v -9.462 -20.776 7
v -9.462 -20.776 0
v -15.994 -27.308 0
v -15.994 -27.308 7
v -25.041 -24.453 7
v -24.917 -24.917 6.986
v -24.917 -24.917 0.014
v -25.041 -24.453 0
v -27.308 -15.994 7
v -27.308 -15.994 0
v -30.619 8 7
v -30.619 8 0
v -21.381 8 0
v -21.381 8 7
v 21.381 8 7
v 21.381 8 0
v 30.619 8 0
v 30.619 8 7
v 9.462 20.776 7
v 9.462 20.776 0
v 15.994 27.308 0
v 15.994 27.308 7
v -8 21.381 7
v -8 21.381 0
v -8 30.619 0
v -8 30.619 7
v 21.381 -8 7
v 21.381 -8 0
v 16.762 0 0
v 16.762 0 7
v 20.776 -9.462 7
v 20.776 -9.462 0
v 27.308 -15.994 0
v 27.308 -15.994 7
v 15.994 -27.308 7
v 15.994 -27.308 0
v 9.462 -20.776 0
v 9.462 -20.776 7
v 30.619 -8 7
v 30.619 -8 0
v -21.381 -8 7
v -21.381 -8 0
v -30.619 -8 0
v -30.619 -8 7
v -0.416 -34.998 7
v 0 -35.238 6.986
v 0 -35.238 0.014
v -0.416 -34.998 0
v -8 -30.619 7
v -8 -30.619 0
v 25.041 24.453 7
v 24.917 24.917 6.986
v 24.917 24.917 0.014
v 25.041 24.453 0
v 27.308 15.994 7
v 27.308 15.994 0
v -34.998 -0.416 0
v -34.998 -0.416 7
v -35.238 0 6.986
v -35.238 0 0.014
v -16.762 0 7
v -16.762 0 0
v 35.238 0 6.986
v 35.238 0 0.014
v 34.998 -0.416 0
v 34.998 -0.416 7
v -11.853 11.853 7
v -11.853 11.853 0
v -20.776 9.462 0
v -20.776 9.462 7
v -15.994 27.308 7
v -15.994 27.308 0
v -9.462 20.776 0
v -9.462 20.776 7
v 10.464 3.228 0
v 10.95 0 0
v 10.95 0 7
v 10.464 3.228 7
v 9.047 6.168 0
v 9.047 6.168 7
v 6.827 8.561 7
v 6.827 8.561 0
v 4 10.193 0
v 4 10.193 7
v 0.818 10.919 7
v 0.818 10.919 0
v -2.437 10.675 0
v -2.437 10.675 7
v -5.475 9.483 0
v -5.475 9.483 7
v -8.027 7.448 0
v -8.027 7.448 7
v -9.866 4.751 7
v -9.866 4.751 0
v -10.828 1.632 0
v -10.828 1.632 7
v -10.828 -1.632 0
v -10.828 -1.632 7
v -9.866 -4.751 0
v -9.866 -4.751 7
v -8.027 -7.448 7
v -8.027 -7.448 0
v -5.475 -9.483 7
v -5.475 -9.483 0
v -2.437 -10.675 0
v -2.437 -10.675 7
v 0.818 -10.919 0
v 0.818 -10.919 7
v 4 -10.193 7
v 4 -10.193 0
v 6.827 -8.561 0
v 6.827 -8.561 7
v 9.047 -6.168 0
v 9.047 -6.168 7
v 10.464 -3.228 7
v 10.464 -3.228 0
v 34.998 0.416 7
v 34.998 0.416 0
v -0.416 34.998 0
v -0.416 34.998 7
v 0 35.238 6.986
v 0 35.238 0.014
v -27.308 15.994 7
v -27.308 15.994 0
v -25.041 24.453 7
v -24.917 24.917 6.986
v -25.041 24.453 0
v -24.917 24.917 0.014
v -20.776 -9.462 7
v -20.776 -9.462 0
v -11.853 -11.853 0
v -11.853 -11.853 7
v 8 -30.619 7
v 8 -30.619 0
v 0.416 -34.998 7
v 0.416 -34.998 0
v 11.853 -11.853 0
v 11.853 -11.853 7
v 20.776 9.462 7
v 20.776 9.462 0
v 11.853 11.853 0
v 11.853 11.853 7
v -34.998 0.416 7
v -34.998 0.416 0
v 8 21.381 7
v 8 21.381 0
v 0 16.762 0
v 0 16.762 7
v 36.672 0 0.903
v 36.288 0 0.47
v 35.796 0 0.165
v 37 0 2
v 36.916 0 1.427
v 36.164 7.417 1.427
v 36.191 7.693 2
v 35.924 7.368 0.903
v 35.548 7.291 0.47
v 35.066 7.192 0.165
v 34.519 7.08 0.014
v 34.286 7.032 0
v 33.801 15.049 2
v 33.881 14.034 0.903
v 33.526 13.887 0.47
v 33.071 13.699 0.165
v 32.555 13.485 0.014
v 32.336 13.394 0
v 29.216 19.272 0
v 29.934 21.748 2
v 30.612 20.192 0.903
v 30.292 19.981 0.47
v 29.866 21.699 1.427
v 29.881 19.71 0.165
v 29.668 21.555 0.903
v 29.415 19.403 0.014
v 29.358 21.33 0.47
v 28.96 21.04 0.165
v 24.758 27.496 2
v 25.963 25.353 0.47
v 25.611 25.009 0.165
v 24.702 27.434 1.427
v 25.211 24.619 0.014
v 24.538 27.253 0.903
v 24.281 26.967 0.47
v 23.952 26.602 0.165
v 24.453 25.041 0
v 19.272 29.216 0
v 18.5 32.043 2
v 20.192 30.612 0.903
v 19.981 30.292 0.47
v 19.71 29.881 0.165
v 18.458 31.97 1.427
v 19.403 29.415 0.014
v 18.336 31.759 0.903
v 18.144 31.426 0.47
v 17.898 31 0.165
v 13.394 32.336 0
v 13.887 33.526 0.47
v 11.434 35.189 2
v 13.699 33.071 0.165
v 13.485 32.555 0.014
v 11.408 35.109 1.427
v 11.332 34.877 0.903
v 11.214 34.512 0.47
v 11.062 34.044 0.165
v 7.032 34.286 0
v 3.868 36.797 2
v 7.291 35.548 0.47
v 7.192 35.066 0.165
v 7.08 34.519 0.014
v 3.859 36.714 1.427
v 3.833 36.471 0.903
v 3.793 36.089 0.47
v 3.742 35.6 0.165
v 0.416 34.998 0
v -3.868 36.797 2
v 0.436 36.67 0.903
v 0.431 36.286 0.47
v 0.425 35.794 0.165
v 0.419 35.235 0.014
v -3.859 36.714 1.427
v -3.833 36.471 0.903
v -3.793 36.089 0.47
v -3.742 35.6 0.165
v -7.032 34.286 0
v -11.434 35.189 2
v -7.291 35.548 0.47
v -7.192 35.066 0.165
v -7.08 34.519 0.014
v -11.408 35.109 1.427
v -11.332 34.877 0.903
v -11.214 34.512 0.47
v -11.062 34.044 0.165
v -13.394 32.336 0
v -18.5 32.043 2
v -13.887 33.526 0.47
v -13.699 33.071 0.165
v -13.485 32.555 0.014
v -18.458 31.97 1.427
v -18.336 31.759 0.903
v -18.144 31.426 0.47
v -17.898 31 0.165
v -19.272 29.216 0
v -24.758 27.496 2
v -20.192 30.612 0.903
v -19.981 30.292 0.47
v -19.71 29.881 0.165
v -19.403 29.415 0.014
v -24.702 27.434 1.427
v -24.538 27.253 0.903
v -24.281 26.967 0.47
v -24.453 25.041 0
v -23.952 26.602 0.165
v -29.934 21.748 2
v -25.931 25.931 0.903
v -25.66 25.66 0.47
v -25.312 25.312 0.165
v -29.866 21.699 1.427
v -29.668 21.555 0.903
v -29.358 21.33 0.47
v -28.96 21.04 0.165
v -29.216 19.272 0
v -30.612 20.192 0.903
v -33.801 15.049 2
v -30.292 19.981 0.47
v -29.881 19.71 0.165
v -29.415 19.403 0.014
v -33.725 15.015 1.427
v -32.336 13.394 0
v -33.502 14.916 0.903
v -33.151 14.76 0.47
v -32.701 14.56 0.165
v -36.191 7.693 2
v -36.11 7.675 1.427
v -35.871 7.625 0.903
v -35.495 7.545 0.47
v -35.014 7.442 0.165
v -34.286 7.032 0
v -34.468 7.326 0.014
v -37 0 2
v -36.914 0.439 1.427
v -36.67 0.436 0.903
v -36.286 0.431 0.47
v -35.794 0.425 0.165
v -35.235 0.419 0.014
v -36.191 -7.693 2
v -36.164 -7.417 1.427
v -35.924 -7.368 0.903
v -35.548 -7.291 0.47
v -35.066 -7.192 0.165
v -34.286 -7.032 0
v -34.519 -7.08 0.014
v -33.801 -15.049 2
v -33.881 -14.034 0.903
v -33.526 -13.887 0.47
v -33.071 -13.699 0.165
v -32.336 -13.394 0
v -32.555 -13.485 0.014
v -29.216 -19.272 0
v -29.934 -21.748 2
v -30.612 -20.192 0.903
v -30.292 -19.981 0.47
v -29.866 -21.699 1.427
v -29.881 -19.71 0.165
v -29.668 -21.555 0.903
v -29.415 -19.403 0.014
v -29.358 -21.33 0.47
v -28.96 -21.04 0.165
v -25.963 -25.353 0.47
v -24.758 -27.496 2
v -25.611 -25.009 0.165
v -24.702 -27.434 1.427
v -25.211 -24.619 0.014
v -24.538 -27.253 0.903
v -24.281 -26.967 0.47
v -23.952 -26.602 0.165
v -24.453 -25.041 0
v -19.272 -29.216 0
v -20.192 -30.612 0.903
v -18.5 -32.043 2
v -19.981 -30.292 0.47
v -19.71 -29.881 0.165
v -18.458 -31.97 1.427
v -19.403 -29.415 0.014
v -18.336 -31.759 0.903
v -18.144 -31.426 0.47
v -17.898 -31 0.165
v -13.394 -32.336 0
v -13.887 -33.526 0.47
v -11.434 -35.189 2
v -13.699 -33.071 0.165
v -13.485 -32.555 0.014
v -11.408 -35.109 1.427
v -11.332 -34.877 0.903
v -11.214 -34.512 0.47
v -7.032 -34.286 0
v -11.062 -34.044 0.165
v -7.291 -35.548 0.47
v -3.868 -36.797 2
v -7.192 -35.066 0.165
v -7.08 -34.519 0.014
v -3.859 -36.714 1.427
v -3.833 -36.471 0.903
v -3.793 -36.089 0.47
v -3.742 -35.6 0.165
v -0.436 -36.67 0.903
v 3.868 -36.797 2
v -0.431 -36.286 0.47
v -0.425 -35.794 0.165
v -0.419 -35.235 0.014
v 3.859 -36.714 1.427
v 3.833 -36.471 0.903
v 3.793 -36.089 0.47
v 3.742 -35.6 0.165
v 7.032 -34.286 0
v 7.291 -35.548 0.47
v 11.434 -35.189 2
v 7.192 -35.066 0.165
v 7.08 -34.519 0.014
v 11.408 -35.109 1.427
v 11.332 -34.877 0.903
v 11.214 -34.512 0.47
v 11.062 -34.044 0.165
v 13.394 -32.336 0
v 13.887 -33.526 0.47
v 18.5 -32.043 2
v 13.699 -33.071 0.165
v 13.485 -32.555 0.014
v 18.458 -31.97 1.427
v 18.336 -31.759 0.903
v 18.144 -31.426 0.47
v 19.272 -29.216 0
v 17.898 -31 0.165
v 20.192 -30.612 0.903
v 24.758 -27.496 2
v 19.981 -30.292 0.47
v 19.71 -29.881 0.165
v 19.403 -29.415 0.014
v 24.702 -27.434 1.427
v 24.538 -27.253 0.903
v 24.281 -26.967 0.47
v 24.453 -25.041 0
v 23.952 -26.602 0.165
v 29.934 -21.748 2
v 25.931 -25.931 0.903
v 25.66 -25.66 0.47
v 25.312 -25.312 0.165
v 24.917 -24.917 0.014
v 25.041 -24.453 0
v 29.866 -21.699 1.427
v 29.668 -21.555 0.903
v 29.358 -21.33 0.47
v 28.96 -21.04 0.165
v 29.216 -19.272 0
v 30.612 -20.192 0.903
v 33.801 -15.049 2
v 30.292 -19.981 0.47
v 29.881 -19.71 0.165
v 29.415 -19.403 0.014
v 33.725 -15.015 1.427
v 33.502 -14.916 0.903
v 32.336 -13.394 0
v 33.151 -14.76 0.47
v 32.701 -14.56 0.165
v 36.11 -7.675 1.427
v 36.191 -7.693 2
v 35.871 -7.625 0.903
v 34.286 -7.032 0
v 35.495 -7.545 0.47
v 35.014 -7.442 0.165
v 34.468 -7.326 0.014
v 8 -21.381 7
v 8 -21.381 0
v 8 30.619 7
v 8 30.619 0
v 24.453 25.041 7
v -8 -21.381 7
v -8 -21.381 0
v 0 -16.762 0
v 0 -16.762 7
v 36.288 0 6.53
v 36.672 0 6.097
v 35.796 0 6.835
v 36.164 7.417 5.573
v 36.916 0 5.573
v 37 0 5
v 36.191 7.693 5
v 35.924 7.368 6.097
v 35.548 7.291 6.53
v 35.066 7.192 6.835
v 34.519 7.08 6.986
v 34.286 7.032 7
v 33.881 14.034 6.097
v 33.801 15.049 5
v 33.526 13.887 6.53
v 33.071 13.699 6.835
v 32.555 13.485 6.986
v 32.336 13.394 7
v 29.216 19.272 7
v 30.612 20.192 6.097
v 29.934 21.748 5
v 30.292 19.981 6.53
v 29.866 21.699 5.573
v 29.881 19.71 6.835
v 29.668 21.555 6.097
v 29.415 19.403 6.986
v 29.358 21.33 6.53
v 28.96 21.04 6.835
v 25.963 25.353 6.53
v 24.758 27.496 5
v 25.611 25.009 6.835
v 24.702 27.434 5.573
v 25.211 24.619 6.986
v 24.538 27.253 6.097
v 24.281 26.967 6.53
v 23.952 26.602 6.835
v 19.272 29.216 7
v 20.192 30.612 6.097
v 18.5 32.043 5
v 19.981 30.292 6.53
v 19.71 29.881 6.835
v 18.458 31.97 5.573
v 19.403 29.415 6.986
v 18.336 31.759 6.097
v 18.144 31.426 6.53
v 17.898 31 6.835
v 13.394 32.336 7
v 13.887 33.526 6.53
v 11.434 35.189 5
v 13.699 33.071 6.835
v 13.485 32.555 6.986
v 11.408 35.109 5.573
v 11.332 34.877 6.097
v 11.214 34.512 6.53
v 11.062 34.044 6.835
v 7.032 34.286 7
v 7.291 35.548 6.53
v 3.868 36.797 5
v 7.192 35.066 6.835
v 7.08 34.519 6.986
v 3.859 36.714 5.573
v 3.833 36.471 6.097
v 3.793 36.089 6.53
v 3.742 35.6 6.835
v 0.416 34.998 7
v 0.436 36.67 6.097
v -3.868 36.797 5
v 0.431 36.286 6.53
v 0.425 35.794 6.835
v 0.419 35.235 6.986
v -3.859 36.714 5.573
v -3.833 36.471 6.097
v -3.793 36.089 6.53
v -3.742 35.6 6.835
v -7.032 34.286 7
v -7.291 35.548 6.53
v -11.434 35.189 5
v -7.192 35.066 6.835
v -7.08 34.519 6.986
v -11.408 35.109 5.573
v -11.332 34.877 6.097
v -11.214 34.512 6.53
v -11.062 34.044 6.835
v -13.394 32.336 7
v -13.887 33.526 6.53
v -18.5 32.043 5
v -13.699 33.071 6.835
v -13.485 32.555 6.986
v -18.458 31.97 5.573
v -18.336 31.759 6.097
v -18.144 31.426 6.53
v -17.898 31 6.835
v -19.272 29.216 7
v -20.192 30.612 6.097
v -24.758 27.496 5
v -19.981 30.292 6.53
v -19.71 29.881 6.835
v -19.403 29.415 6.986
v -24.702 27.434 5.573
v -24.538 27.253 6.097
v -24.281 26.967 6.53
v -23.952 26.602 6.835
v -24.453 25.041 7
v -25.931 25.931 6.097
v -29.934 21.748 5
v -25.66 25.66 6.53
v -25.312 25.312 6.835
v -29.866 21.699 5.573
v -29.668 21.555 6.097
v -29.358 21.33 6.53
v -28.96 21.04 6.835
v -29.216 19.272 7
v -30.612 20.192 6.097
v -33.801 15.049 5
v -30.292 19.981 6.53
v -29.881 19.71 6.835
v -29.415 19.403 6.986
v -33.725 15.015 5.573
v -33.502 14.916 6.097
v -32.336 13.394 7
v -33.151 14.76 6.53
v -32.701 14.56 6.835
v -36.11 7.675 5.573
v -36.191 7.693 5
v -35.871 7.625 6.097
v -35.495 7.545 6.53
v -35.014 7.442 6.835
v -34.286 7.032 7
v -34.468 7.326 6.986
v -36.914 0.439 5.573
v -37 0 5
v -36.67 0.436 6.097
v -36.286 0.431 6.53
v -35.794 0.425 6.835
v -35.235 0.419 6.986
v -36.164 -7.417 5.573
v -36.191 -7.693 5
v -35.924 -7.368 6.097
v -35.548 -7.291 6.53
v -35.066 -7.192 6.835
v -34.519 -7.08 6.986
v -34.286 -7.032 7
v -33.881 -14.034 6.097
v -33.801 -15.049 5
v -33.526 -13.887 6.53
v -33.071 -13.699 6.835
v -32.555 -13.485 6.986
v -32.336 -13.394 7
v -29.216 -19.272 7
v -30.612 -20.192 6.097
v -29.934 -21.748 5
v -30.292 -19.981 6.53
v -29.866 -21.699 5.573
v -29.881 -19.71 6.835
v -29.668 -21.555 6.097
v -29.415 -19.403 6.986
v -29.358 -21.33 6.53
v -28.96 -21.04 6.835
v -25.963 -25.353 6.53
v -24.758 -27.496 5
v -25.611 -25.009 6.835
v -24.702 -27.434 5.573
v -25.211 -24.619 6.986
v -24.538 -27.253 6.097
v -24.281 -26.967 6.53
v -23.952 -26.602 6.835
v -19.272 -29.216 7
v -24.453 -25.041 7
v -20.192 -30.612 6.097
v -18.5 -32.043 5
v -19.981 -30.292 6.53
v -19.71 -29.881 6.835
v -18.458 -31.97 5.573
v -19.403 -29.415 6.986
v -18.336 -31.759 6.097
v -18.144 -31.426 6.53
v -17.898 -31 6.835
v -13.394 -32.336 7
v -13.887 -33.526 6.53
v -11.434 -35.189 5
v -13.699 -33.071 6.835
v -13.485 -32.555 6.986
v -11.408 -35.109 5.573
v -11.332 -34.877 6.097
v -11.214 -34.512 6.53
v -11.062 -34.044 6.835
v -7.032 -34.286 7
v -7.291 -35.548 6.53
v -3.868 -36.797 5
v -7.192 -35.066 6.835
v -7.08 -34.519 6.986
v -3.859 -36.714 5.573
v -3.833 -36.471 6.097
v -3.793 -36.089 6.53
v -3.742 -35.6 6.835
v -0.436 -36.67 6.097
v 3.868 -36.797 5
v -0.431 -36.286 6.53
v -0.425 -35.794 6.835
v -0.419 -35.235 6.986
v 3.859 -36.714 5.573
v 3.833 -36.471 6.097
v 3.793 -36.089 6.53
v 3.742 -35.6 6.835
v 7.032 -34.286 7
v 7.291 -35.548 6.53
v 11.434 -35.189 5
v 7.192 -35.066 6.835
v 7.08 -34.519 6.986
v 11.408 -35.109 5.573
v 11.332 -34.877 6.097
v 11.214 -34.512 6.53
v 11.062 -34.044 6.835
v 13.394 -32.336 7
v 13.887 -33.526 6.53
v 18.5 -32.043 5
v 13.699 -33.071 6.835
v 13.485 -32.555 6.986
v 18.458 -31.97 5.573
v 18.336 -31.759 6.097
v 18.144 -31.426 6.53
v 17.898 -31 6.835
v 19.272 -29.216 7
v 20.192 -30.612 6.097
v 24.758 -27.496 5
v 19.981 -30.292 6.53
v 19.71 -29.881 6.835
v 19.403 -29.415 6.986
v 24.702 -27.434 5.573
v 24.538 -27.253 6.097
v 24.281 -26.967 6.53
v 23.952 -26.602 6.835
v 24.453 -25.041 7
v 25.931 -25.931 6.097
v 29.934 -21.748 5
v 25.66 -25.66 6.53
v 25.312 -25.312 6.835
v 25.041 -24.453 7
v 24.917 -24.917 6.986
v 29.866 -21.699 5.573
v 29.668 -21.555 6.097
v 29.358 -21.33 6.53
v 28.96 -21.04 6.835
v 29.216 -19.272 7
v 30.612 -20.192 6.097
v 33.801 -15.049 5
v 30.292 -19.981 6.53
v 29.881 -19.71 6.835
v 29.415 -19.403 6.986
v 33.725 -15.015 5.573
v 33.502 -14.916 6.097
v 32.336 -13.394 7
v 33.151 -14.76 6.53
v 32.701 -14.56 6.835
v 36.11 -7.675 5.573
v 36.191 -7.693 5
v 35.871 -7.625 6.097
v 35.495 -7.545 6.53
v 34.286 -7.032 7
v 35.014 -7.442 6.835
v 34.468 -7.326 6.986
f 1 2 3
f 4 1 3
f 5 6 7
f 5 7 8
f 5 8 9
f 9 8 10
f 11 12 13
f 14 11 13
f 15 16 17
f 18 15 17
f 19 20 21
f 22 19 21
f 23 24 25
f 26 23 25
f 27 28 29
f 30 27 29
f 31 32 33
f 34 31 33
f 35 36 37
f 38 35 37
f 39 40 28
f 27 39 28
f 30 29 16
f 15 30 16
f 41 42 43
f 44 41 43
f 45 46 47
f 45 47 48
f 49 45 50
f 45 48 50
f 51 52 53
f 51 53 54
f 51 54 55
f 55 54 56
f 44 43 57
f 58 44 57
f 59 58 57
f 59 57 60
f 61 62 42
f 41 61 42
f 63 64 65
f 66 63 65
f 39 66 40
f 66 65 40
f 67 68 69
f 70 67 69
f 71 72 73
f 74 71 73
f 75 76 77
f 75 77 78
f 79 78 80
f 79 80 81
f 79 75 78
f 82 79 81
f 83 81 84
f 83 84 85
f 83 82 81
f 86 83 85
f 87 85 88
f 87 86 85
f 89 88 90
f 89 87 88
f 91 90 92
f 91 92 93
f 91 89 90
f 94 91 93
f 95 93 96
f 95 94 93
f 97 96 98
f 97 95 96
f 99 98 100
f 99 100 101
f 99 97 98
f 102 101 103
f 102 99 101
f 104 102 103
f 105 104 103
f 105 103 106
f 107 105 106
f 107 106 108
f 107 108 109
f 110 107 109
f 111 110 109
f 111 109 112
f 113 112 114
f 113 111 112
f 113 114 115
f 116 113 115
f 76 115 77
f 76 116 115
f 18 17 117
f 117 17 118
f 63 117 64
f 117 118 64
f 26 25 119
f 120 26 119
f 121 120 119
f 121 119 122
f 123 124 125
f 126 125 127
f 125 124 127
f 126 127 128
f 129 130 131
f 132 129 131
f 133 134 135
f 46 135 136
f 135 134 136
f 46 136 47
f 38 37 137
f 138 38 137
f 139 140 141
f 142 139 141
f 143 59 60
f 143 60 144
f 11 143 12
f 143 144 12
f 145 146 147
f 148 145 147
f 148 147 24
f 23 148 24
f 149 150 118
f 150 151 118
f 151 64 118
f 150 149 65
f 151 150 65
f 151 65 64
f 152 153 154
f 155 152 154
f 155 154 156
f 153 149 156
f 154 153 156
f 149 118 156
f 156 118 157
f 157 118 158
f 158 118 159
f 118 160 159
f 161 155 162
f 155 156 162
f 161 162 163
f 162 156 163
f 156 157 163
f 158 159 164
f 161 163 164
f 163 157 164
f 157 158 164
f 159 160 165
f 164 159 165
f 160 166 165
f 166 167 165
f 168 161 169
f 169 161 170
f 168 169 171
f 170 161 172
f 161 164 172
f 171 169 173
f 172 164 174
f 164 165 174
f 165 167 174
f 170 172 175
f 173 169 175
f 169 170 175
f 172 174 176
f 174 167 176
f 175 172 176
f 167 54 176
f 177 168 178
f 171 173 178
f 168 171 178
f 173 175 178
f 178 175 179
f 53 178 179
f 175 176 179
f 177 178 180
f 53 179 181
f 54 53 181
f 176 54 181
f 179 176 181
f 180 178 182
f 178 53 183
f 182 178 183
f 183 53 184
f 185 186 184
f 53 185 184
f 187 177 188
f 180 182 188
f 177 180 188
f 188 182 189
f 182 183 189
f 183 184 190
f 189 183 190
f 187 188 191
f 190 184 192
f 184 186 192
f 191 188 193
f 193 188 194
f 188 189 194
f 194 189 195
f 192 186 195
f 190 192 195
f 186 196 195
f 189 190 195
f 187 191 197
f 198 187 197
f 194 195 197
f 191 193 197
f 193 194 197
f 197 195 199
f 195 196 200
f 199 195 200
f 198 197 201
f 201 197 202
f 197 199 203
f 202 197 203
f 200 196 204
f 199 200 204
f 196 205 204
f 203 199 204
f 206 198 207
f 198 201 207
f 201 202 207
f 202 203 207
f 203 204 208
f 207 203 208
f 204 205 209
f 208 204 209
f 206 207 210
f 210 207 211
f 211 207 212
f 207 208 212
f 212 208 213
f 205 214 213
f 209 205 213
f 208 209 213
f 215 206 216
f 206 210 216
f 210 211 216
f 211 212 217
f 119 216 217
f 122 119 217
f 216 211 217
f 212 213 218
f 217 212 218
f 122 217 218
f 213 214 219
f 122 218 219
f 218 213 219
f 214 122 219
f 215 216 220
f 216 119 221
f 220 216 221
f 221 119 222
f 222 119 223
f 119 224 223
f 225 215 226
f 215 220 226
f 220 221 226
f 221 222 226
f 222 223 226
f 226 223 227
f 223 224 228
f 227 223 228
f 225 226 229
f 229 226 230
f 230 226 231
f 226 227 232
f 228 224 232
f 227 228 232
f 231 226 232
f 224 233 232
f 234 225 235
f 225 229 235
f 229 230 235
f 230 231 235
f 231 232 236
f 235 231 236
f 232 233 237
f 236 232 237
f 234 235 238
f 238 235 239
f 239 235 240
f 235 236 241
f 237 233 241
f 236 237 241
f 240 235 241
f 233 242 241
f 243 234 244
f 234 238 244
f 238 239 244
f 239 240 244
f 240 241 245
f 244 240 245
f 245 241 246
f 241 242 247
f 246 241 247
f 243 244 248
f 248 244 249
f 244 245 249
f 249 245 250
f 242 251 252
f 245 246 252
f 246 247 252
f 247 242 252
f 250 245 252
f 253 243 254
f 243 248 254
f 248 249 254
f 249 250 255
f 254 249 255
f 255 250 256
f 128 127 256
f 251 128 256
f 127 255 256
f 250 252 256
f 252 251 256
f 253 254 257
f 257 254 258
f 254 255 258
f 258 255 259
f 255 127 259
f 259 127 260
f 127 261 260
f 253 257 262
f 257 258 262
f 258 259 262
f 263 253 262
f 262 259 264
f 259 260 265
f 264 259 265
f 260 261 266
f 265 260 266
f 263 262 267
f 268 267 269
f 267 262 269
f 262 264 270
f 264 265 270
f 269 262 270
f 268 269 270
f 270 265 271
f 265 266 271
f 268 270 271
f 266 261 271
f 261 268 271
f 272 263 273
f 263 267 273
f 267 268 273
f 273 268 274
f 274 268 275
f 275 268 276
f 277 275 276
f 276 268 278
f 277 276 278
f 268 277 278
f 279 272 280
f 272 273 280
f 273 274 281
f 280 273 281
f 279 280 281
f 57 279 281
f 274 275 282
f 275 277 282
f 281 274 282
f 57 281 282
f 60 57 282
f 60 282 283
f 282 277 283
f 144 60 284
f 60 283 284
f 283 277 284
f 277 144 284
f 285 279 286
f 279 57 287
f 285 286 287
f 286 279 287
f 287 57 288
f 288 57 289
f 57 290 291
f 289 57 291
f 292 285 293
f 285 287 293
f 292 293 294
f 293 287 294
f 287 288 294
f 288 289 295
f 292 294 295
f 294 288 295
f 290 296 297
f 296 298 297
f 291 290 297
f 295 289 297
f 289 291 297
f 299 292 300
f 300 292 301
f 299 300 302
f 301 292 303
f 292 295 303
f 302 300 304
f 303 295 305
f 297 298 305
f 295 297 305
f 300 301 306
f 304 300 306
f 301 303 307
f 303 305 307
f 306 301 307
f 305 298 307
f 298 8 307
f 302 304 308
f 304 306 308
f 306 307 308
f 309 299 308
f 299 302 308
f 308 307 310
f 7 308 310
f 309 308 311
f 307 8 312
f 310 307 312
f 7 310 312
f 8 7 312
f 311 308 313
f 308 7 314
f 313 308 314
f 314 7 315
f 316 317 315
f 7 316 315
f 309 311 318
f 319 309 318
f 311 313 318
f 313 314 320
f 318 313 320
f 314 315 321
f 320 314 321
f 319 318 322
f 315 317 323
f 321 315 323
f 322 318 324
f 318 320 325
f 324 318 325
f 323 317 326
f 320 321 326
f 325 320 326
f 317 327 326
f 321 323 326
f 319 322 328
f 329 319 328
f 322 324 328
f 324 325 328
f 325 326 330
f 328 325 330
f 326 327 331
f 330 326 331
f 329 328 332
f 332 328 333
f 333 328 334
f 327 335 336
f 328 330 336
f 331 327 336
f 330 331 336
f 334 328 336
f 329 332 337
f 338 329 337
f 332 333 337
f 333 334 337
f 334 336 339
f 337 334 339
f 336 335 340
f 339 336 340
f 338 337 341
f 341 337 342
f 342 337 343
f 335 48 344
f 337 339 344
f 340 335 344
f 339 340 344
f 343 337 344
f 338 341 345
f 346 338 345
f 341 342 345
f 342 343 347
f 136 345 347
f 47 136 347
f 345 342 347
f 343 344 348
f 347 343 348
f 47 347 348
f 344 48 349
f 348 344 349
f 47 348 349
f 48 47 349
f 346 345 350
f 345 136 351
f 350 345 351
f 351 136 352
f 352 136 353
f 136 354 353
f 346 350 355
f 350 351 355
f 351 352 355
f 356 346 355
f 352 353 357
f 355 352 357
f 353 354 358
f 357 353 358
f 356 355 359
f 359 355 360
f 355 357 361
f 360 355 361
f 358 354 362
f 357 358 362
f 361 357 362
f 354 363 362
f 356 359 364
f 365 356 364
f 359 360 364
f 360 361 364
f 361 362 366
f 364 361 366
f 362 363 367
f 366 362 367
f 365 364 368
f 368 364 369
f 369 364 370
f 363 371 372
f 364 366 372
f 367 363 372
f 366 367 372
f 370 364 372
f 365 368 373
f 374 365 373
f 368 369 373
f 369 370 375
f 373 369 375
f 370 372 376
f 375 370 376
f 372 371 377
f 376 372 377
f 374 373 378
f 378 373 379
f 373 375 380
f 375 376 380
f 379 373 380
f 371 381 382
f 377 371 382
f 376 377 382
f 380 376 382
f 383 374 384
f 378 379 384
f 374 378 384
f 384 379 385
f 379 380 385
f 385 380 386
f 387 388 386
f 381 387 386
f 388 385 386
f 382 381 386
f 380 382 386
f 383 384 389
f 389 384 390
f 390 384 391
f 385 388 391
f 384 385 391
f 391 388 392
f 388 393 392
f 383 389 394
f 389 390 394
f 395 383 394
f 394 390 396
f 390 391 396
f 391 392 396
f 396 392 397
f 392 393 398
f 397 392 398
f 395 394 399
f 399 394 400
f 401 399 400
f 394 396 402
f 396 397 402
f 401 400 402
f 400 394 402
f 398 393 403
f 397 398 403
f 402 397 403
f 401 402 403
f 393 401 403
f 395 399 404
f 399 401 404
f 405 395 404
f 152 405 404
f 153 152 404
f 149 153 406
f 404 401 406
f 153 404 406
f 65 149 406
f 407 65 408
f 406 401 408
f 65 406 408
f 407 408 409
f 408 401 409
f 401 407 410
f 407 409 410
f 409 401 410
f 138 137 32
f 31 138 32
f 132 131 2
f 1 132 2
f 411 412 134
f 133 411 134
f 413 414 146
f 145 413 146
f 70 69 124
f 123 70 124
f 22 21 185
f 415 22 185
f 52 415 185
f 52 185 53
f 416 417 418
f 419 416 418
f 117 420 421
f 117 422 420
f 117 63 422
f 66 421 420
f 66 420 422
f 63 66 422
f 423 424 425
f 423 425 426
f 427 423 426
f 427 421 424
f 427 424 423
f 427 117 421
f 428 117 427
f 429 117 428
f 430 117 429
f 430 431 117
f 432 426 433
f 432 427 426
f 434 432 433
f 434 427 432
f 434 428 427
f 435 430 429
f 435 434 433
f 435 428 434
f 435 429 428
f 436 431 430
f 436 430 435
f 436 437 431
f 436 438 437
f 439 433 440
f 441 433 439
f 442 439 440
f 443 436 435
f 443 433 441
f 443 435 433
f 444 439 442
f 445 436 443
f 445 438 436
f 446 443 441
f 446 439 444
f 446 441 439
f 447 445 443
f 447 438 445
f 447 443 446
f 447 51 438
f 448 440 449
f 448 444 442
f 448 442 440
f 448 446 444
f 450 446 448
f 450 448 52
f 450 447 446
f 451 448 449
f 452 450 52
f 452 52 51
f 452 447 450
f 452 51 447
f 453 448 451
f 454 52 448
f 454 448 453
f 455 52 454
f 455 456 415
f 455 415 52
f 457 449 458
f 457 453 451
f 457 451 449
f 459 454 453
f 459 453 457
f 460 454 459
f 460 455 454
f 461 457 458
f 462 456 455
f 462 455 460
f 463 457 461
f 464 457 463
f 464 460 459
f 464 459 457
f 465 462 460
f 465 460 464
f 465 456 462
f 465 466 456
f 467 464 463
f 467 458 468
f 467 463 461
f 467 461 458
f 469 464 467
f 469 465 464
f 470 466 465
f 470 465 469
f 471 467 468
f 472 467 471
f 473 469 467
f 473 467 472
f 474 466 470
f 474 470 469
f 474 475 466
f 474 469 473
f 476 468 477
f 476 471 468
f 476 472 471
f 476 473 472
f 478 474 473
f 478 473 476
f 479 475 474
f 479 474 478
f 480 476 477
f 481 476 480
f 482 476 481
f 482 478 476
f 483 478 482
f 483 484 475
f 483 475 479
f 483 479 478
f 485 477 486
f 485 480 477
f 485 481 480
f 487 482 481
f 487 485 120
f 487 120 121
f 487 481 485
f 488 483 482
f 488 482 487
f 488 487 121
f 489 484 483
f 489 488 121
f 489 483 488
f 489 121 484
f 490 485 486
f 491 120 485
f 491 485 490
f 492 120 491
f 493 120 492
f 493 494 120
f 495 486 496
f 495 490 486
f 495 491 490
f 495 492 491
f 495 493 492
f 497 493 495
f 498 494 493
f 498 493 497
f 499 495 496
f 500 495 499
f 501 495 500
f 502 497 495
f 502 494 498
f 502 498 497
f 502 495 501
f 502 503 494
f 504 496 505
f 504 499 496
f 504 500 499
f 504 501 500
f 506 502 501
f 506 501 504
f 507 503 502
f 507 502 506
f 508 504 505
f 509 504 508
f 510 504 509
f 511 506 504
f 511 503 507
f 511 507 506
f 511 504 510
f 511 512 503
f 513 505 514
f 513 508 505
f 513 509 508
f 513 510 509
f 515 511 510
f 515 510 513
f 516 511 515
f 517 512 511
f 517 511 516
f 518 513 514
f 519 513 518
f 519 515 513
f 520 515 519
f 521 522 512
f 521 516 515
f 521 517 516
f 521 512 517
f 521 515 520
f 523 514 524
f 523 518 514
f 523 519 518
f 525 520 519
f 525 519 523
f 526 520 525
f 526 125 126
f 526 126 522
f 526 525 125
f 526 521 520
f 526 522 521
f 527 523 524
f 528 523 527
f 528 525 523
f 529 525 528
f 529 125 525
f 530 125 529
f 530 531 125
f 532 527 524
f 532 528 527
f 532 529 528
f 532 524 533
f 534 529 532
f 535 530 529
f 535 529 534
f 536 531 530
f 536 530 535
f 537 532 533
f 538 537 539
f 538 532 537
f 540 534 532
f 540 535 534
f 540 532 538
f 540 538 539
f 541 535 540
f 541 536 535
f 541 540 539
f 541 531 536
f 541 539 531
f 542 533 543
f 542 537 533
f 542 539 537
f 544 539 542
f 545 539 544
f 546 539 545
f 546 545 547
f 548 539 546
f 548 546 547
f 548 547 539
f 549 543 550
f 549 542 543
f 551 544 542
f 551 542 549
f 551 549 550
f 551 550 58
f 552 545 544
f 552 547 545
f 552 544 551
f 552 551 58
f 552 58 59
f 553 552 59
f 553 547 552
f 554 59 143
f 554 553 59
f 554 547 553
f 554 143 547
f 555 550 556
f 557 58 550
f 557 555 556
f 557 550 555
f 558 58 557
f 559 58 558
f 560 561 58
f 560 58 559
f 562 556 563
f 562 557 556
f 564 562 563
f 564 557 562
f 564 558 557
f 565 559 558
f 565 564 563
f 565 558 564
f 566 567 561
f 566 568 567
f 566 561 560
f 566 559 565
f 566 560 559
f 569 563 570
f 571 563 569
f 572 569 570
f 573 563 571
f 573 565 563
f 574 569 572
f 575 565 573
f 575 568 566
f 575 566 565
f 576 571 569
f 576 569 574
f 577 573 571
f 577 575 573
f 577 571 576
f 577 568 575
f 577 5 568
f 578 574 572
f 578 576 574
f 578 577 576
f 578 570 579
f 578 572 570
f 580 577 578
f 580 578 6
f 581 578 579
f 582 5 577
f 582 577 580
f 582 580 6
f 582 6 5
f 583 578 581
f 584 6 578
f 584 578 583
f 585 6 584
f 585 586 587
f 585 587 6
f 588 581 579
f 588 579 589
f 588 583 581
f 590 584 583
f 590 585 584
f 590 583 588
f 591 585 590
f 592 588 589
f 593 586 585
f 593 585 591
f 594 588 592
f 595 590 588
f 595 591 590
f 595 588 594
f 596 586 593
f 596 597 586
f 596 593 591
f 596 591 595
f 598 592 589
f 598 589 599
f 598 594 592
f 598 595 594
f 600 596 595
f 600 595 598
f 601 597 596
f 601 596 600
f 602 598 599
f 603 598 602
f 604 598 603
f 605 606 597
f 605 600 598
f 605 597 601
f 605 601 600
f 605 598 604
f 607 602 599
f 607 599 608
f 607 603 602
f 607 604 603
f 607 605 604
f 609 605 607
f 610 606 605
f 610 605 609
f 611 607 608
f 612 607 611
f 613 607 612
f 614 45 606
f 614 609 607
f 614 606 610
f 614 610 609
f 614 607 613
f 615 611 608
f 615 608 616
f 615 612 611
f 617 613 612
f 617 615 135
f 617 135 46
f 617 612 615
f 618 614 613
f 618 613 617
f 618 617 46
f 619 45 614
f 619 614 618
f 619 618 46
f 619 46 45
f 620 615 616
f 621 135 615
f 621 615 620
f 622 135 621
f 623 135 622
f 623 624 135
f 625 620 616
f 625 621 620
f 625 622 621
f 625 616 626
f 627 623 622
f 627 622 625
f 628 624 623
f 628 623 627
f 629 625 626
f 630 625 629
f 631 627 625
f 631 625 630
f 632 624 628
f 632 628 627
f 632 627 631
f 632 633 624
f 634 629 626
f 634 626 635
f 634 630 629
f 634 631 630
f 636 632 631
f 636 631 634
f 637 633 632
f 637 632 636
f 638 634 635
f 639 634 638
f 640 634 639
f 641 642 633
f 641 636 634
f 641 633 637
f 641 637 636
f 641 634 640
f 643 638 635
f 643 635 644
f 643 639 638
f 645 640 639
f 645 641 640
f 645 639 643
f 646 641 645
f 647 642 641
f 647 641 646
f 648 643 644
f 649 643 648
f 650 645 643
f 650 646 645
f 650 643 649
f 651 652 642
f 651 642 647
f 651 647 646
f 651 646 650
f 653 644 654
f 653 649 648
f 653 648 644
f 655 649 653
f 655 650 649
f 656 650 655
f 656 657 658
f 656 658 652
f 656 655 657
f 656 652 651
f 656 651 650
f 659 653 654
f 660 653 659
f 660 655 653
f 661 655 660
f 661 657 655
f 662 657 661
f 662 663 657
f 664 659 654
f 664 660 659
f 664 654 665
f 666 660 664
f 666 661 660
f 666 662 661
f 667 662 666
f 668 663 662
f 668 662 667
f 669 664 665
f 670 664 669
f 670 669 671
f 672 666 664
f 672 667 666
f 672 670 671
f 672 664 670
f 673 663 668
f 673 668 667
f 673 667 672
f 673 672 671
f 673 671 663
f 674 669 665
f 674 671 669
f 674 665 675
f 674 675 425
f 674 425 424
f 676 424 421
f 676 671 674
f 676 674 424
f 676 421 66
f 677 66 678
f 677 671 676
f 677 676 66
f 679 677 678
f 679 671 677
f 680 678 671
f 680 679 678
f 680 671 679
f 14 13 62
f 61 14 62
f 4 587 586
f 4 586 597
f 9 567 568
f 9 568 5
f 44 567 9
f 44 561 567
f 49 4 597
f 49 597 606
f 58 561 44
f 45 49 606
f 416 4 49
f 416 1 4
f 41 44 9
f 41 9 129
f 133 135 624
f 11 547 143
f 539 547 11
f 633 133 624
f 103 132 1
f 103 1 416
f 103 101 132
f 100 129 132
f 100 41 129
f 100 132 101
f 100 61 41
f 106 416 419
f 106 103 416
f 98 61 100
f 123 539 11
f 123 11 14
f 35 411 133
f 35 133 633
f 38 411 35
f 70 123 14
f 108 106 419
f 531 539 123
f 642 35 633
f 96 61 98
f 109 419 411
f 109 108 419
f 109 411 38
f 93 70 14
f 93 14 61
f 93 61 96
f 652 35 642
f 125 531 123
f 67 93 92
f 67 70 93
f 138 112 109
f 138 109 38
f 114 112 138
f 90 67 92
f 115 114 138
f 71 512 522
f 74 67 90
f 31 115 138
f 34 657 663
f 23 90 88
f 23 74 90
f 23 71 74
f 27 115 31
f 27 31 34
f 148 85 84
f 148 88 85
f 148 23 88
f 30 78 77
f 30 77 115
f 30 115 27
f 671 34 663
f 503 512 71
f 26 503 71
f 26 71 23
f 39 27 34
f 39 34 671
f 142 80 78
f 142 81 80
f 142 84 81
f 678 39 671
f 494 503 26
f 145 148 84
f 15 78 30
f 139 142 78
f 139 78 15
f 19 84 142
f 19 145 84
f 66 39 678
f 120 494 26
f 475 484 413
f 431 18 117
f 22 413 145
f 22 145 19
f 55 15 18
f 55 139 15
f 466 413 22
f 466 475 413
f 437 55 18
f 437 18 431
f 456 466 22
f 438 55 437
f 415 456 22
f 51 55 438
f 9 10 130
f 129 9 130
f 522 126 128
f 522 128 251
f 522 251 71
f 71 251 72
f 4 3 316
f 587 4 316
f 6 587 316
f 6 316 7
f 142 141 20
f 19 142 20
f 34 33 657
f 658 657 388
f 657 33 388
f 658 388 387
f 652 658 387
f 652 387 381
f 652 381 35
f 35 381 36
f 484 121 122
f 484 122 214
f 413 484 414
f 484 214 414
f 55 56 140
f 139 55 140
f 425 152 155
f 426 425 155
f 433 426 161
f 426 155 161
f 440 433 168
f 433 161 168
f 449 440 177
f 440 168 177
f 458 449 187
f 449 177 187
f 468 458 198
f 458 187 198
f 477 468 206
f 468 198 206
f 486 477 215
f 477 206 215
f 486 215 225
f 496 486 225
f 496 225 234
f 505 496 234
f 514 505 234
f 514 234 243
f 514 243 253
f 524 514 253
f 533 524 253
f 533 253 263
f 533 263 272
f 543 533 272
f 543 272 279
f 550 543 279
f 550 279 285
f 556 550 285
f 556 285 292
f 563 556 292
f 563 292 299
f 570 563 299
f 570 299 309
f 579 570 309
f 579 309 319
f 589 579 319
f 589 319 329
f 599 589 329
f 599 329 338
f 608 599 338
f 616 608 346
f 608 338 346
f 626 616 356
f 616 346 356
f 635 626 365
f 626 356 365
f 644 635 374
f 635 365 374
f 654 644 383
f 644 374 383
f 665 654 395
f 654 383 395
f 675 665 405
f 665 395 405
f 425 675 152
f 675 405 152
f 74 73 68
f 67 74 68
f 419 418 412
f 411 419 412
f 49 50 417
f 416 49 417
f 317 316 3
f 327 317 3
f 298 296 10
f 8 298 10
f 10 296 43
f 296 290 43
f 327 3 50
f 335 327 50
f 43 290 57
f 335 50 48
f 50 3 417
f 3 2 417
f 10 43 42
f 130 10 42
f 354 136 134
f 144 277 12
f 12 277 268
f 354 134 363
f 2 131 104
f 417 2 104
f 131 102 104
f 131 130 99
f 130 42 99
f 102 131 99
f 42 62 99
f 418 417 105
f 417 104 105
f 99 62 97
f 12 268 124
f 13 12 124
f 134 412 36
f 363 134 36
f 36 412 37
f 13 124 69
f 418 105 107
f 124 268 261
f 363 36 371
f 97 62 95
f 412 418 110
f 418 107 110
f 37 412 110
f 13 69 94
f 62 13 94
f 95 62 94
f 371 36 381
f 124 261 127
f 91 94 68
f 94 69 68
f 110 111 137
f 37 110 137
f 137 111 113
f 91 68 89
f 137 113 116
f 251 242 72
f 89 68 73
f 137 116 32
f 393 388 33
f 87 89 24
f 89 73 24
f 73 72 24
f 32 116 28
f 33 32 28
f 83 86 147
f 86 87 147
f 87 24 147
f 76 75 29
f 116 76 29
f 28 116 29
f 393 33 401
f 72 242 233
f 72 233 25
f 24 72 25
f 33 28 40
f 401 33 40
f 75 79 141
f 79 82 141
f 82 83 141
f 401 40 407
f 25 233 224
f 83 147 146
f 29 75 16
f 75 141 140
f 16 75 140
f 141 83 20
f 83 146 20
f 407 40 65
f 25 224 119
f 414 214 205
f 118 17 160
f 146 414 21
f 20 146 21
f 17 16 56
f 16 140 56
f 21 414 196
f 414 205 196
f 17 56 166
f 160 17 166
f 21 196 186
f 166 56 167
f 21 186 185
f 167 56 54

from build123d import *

# Parameters (mm, degrees)
F0_R     = 37
F0_R_2   = 10.95
F1_DEPTH = 7


# Not quite as in the source:
# - a fillet or chamfer that OpenCascade refuses, or shapes differently, is made with other operations: its cross-section is extruded or revolved along the edge and cut away or added


with BuildPart() as f1:
    # F0 (on Top) → F1 (new body)
    with BuildSketch(Plane.XY):
        Circle(F0_R)
        Polygon((-15.9939083851, -27.3076168841), (-24.9167489583, -24.9167489583), (-27.3076168841, -15.9939083851), (-20.7756442366, -9.4619357376), (-11.8528036634, -11.8528036634), (-9.4619357376, -20.7756442366), align=None, mode=Mode.SUBTRACT)
        Polygon((8, -30.6188021535), (0, -35.237604307), (-8, -30.6188021535), (-8, -21.3811978465), (0, -16.762395693), (8, -21.3811978465), align=None, mode=Mode.SUBTRACT)
        Polygon((27.3076168841, -15.9939083851), (24.9167489583, -24.9167489583), (15.9939083851, -27.3076168841), (9.4619357376, -20.7756442366), (11.8528036634, -11.8528036634), (20.7756442366, -9.4619357376), align=None, mode=Mode.SUBTRACT)
        Polygon((-30.6188021535, -8), (-35.237604307, 0), (-30.6188021535, 8), (-21.3811978465, 8), (-16.762395693, 0), (-21.3811978465, -8), align=None, mode=Mode.SUBTRACT)
        Polygon((-27.3076168841, 15.9939083851), (-24.9167489583, 24.9167489583), (-15.9939083851, 27.3076168841), (-9.4619357376, 20.7756442366), (-11.8528036634, 11.8528036634), (-20.7756442366, 9.4619357376), align=None, mode=Mode.SUBTRACT)
        Circle(F0_R_2, mode=Mode.SUBTRACT)
        Polygon((15.9939083851, 27.3076168841), (24.9167489583, 24.9167489583), (27.3076168841, 15.9939083851), (20.7756442366, 9.4619357376), (11.8528036634, 11.8528036634), (9.4619357376, 20.7756442366), align=None, mode=Mode.SUBTRACT)
        Polygon((30.6188021535, 8), (35.237604307, 0), (30.6188021535, -8), (21.3811978465, -8), (16.762395693, 0), (21.3811978465, 8), align=None, mode=Mode.SUBTRACT)
        Polygon((0, 35.237604307), (8, 30.6188021535), (8, 21.3811978465), (0, 16.762395693), (-8, 21.3811978465), (-8, 30.6188021535), align=None, mode=Mode.SUBTRACT)
    extrude(amount=F1_DEPTH)

    # F2: fillet of radius 2 on 2 edges, made by hand

    # F2_s1 → F2_t2 (revolve, cut)
    with BuildSketch(Plane.XZ):
        with BuildLine():
            ThreePointArc((37, 5), (36.4142135624, 6.4142135624), (35, 7))
            Line((35, 7), (37, 7))
            Line((37, 7), (37, 5))
        make_face()
    revolve(axis=Axis((0, 0, 7), (0, 0, 1)), mode=Mode.SUBTRACT)

    # F2_s3 → F2_t4 (revolve, cut)
    with BuildSketch(Plane.XZ):
        with BuildLine():
            ThreePointArc((37, 2), (36.4142135624, 0.5857864376), (35, 0))
            Line((35, 0), (37, 0))
            Line((37, 0), (37, 2))
        make_face()
    revolve(axis=Axis((0, 0, 0), (0, 0, 1)), mode=Mode.SUBTRACT)


solid = f1.part
